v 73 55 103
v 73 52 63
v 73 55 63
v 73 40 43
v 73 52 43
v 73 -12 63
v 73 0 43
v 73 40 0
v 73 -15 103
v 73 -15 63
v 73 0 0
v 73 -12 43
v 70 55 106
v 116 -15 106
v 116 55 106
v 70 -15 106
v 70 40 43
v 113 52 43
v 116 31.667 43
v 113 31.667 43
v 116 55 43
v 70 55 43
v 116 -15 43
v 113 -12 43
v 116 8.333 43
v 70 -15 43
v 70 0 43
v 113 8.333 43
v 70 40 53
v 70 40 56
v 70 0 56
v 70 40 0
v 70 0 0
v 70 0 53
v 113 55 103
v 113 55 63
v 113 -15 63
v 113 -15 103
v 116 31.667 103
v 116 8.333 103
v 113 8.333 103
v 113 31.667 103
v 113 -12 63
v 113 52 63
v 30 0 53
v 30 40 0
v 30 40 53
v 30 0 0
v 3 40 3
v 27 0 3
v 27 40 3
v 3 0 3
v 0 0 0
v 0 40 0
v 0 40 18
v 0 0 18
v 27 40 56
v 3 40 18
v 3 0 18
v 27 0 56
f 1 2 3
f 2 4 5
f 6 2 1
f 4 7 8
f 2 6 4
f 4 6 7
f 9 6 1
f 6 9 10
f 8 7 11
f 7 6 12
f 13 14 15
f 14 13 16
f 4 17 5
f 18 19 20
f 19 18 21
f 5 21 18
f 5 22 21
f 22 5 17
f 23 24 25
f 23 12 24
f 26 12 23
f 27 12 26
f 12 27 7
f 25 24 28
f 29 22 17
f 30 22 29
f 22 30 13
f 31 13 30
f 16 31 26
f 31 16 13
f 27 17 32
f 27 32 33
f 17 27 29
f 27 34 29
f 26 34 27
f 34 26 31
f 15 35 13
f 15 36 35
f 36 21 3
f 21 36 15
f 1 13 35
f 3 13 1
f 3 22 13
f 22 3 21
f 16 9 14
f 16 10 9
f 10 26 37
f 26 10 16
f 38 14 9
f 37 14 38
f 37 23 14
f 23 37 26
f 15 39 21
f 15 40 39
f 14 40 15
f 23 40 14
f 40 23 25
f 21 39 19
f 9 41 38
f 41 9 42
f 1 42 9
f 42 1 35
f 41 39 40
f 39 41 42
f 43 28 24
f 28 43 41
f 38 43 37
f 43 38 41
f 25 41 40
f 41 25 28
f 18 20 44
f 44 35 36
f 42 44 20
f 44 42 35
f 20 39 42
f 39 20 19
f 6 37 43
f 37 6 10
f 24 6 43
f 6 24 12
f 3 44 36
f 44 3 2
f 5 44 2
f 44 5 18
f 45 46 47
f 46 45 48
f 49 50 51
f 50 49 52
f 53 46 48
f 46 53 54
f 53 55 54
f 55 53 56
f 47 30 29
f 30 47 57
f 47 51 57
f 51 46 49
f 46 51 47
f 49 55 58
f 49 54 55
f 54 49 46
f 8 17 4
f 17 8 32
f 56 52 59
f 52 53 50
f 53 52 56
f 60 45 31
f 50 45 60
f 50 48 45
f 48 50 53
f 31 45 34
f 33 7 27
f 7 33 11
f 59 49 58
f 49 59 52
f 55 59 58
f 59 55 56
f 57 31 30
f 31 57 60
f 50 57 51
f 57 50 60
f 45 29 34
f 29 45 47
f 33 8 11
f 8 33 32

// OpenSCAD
echo(version=version());
// Base Config
base_W = 40;
base_H = 53;
// fix num
base_T = 3;
baee_R = 12;
$fn = 60;

box_W = 70;
box_H = 40;
box_A = -((box_W - base_W) / 2);

translate([0, 0, 0]) cube([24 + base_T + base_T, base_W, base_T]);
translate([0, 0, 0]) cube([base_T, base_W, 15 + base_T]);
translate([24 + base_T, 0, 0]) cube([base_T, base_W, 50 + base_T + base_T]);
translate([24 + base_T, 0, 53]) cube([40 + base_T + base_T, base_W, base_T]);
translate([70, 0, 0]) cube([base_T, base_W, 50 + base_T + base_T]);

// translate([60, 5, 10]) cube([7 + base_T + base_T, 10, 2]);
// translate([60, 25, 10]) cube([7 + base_T + base_T, 10, 2]);
translate([0, box_A, 0]) union(){
	translate([70, 0, 40 + base_T]) cube([base_T, box_W, 60 + base_T]);
	translate([70, 0, 100 + base_T]) cube([box_H + base_T + base_T, box_W, base_T]);
	translate([box_H + 70 + base_T, 0, 40 + base_T]) cube([base_T, box_W / 3, 60 + base_T]);
	translate([box_H + 70 + base_T, (box_W / 3) * 2, 40 + base_T]) cube([base_T, box_W / 3, 60 + base_T]);
	translate([70, 0, 40 + base_T]) cube([box_H + base_T + base_T, base_T, 20]);
	translate([70, box_W - base_T, 40 + base_T]) cube([box_H + base_T + base_T, base_T, 20]);
}


// // main hock body
// cube(size=[base_T, base_H, base_W], center=false);
// // Top hock
// translate([-6, base_H, 0]) cube(size=[8.5, base_T, base_W], center=false);
// translate([-6, base_H - 6, 0]) cube(size=[base_T, 6.5, base_W], center=false);
// translate([-3, base_H - 5.2, 0]) cylinder(h=base_W, r=1, center=false, $fn=3);
// // stable parts
// // main hock r
// translate([12, 0, 0]) difference() {
//     cylinder(h=base_W, r=baee_R, center=false);
//     cylinder(h=base_W + 2, r=baee_R-base_T, center=false);
//     translate([-9.5, 0, -1]) cube(size=[25, 14, base_W + 2], center=false);
//     translate([0, 0, -1]) rotate([0, 0, -30]) cube(size=[25, 14, base_W + 2], center=false);
// }
// // main hock extend
// translate([20, -5.1, 0]) rotate([0, 0, -20]) cube(size=[base_T, 10, base_W], center=false);
// // bottom fuck
// translate([-6, -2.5, 0]) cube(size=[8.5, base_T, base_W], center=false);
// translate([-5.15, 0.5, 0]) rotate([0, 0, 90]) cylinder(h=base_W, r=1, center=false, $fn=3);
// translate([-6, 4, 0]) cube(size=[8.5, base_T, base_W], center=false);
